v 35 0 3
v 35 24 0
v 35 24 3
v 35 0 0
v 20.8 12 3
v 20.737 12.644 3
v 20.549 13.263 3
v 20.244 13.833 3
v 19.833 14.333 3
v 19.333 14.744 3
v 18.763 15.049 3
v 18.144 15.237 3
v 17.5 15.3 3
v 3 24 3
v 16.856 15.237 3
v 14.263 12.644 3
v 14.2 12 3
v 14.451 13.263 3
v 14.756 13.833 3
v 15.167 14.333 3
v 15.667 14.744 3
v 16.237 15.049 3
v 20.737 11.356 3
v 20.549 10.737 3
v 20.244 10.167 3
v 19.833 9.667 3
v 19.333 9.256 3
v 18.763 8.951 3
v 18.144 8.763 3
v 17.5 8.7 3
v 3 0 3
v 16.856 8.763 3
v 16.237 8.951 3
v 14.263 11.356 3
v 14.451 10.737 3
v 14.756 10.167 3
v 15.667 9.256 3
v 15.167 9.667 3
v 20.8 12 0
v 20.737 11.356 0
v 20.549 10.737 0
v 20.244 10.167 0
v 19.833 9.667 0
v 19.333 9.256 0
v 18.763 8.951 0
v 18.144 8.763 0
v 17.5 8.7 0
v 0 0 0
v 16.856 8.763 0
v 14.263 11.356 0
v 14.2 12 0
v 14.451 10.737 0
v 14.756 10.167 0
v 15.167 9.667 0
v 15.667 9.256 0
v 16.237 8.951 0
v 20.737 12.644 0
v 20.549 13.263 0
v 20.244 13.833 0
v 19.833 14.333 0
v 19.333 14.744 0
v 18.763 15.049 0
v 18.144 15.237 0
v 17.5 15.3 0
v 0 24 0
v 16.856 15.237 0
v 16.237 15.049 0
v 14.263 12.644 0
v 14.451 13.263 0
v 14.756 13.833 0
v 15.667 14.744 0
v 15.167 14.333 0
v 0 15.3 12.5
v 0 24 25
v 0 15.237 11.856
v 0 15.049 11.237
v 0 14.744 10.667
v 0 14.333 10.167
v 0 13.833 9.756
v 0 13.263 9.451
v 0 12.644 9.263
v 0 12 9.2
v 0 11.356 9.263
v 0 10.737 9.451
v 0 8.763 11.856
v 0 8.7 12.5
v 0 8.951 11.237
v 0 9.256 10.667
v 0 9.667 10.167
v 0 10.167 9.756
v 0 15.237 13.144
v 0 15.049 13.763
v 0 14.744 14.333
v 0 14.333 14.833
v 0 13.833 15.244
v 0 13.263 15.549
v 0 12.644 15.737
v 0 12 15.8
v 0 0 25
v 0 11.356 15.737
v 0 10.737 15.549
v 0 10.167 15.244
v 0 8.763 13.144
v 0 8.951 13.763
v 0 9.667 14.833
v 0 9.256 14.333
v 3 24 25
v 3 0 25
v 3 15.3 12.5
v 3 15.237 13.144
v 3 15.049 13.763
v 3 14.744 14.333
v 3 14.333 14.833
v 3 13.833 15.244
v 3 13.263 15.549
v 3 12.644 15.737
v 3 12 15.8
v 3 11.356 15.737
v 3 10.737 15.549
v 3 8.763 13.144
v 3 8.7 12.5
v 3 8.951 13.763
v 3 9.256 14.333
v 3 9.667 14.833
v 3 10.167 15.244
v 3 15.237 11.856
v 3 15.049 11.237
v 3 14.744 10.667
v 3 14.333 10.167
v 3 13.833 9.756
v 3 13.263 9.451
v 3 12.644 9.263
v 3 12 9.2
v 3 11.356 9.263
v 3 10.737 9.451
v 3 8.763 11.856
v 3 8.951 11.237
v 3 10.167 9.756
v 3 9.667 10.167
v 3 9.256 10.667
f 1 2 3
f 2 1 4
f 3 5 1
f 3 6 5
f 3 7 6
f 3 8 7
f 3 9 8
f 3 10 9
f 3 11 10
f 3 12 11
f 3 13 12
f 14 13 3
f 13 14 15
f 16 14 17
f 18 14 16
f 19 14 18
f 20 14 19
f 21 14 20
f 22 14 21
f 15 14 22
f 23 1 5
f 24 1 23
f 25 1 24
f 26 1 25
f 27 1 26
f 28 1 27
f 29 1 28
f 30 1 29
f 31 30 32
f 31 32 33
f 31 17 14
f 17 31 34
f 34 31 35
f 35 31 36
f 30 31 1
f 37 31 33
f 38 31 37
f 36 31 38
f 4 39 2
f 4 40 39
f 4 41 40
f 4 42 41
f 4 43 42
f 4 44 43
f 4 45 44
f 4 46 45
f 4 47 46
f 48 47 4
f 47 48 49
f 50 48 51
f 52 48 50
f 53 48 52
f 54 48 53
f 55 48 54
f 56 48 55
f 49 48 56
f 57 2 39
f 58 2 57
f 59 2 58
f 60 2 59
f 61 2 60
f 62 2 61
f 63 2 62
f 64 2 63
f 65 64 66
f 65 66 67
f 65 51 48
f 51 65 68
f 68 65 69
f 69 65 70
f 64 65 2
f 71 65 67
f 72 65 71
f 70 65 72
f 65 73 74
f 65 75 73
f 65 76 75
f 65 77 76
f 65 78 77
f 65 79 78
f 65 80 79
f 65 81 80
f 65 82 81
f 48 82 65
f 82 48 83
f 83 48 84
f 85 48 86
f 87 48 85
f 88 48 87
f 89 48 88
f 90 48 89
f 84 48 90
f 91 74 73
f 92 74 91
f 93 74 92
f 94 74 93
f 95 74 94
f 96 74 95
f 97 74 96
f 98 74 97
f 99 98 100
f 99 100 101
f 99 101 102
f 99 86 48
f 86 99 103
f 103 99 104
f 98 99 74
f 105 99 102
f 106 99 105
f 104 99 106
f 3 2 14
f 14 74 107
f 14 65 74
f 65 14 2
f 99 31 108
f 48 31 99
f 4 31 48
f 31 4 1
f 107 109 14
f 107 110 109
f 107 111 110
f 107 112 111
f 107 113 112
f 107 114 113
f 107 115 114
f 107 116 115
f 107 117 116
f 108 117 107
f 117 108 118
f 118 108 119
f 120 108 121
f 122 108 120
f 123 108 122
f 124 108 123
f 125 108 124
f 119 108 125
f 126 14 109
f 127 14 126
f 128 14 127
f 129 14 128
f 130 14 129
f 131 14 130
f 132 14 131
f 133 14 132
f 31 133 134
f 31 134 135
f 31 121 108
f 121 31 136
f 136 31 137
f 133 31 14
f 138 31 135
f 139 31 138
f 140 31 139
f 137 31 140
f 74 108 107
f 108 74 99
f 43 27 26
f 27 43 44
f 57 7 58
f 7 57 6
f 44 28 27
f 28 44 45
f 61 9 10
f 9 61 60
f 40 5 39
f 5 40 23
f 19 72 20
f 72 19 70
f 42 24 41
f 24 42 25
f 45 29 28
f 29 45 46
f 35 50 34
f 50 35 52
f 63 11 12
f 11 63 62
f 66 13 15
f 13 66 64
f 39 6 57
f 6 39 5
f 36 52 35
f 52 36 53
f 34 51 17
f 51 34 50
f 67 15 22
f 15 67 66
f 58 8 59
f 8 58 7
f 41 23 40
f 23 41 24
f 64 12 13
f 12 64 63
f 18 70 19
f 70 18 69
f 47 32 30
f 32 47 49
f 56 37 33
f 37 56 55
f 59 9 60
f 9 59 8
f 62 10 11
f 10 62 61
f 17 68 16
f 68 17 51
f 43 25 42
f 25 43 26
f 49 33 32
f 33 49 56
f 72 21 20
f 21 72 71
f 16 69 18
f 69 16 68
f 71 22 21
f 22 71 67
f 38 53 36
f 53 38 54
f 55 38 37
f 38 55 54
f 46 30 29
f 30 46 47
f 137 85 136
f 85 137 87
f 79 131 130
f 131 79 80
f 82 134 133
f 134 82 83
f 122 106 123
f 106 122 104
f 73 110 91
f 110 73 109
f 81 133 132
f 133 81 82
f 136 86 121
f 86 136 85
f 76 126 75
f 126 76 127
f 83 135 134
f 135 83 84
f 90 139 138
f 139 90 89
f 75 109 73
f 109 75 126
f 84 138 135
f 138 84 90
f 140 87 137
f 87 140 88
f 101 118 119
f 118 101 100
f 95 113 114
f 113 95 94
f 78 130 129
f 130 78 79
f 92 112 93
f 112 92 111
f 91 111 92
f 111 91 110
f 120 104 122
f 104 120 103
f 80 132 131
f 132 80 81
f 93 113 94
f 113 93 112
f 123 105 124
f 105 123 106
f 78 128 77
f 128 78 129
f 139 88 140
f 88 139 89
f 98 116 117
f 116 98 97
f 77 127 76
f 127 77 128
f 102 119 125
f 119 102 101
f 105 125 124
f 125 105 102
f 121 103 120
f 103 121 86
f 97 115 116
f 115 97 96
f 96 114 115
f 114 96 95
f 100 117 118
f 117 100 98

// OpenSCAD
$fn = 32;

// ----------------------------------------------------------------------
// L-bracket: 35 x 24 x 25 mm
// ----------------------------------------------------------------------

// --- parameters (mm) ---
run_out = 35;             // horizontal leg, X
rise = 25;                // vertical leg, Z
bracket_w = 24;           // bracket depth, Y
sheet_t = 3;              // plate thickness
hole_d = 6.6;             // clearance for M6

module hole_z(px, py) {
  translate([px, py, -0.5]) cylinder(h = sheet_t + 1, d = hole_d);
}
module hole_x(pz, py) {
  translate([-0.5, py, pz]) rotate([0, 90, 0]) cylinder(h = sheet_t + 1, d = hole_d);
}

difference() {
  union() {
    /* horizontal leg */
    cube([run_out, bracket_w, sheet_t]);
    /* vertical leg, overlapping the corner block */
    cube([sheet_t, bracket_w, rise]);
  }
  hole_z(17.5, 12);
  hole_x(12.5, 12);
}
